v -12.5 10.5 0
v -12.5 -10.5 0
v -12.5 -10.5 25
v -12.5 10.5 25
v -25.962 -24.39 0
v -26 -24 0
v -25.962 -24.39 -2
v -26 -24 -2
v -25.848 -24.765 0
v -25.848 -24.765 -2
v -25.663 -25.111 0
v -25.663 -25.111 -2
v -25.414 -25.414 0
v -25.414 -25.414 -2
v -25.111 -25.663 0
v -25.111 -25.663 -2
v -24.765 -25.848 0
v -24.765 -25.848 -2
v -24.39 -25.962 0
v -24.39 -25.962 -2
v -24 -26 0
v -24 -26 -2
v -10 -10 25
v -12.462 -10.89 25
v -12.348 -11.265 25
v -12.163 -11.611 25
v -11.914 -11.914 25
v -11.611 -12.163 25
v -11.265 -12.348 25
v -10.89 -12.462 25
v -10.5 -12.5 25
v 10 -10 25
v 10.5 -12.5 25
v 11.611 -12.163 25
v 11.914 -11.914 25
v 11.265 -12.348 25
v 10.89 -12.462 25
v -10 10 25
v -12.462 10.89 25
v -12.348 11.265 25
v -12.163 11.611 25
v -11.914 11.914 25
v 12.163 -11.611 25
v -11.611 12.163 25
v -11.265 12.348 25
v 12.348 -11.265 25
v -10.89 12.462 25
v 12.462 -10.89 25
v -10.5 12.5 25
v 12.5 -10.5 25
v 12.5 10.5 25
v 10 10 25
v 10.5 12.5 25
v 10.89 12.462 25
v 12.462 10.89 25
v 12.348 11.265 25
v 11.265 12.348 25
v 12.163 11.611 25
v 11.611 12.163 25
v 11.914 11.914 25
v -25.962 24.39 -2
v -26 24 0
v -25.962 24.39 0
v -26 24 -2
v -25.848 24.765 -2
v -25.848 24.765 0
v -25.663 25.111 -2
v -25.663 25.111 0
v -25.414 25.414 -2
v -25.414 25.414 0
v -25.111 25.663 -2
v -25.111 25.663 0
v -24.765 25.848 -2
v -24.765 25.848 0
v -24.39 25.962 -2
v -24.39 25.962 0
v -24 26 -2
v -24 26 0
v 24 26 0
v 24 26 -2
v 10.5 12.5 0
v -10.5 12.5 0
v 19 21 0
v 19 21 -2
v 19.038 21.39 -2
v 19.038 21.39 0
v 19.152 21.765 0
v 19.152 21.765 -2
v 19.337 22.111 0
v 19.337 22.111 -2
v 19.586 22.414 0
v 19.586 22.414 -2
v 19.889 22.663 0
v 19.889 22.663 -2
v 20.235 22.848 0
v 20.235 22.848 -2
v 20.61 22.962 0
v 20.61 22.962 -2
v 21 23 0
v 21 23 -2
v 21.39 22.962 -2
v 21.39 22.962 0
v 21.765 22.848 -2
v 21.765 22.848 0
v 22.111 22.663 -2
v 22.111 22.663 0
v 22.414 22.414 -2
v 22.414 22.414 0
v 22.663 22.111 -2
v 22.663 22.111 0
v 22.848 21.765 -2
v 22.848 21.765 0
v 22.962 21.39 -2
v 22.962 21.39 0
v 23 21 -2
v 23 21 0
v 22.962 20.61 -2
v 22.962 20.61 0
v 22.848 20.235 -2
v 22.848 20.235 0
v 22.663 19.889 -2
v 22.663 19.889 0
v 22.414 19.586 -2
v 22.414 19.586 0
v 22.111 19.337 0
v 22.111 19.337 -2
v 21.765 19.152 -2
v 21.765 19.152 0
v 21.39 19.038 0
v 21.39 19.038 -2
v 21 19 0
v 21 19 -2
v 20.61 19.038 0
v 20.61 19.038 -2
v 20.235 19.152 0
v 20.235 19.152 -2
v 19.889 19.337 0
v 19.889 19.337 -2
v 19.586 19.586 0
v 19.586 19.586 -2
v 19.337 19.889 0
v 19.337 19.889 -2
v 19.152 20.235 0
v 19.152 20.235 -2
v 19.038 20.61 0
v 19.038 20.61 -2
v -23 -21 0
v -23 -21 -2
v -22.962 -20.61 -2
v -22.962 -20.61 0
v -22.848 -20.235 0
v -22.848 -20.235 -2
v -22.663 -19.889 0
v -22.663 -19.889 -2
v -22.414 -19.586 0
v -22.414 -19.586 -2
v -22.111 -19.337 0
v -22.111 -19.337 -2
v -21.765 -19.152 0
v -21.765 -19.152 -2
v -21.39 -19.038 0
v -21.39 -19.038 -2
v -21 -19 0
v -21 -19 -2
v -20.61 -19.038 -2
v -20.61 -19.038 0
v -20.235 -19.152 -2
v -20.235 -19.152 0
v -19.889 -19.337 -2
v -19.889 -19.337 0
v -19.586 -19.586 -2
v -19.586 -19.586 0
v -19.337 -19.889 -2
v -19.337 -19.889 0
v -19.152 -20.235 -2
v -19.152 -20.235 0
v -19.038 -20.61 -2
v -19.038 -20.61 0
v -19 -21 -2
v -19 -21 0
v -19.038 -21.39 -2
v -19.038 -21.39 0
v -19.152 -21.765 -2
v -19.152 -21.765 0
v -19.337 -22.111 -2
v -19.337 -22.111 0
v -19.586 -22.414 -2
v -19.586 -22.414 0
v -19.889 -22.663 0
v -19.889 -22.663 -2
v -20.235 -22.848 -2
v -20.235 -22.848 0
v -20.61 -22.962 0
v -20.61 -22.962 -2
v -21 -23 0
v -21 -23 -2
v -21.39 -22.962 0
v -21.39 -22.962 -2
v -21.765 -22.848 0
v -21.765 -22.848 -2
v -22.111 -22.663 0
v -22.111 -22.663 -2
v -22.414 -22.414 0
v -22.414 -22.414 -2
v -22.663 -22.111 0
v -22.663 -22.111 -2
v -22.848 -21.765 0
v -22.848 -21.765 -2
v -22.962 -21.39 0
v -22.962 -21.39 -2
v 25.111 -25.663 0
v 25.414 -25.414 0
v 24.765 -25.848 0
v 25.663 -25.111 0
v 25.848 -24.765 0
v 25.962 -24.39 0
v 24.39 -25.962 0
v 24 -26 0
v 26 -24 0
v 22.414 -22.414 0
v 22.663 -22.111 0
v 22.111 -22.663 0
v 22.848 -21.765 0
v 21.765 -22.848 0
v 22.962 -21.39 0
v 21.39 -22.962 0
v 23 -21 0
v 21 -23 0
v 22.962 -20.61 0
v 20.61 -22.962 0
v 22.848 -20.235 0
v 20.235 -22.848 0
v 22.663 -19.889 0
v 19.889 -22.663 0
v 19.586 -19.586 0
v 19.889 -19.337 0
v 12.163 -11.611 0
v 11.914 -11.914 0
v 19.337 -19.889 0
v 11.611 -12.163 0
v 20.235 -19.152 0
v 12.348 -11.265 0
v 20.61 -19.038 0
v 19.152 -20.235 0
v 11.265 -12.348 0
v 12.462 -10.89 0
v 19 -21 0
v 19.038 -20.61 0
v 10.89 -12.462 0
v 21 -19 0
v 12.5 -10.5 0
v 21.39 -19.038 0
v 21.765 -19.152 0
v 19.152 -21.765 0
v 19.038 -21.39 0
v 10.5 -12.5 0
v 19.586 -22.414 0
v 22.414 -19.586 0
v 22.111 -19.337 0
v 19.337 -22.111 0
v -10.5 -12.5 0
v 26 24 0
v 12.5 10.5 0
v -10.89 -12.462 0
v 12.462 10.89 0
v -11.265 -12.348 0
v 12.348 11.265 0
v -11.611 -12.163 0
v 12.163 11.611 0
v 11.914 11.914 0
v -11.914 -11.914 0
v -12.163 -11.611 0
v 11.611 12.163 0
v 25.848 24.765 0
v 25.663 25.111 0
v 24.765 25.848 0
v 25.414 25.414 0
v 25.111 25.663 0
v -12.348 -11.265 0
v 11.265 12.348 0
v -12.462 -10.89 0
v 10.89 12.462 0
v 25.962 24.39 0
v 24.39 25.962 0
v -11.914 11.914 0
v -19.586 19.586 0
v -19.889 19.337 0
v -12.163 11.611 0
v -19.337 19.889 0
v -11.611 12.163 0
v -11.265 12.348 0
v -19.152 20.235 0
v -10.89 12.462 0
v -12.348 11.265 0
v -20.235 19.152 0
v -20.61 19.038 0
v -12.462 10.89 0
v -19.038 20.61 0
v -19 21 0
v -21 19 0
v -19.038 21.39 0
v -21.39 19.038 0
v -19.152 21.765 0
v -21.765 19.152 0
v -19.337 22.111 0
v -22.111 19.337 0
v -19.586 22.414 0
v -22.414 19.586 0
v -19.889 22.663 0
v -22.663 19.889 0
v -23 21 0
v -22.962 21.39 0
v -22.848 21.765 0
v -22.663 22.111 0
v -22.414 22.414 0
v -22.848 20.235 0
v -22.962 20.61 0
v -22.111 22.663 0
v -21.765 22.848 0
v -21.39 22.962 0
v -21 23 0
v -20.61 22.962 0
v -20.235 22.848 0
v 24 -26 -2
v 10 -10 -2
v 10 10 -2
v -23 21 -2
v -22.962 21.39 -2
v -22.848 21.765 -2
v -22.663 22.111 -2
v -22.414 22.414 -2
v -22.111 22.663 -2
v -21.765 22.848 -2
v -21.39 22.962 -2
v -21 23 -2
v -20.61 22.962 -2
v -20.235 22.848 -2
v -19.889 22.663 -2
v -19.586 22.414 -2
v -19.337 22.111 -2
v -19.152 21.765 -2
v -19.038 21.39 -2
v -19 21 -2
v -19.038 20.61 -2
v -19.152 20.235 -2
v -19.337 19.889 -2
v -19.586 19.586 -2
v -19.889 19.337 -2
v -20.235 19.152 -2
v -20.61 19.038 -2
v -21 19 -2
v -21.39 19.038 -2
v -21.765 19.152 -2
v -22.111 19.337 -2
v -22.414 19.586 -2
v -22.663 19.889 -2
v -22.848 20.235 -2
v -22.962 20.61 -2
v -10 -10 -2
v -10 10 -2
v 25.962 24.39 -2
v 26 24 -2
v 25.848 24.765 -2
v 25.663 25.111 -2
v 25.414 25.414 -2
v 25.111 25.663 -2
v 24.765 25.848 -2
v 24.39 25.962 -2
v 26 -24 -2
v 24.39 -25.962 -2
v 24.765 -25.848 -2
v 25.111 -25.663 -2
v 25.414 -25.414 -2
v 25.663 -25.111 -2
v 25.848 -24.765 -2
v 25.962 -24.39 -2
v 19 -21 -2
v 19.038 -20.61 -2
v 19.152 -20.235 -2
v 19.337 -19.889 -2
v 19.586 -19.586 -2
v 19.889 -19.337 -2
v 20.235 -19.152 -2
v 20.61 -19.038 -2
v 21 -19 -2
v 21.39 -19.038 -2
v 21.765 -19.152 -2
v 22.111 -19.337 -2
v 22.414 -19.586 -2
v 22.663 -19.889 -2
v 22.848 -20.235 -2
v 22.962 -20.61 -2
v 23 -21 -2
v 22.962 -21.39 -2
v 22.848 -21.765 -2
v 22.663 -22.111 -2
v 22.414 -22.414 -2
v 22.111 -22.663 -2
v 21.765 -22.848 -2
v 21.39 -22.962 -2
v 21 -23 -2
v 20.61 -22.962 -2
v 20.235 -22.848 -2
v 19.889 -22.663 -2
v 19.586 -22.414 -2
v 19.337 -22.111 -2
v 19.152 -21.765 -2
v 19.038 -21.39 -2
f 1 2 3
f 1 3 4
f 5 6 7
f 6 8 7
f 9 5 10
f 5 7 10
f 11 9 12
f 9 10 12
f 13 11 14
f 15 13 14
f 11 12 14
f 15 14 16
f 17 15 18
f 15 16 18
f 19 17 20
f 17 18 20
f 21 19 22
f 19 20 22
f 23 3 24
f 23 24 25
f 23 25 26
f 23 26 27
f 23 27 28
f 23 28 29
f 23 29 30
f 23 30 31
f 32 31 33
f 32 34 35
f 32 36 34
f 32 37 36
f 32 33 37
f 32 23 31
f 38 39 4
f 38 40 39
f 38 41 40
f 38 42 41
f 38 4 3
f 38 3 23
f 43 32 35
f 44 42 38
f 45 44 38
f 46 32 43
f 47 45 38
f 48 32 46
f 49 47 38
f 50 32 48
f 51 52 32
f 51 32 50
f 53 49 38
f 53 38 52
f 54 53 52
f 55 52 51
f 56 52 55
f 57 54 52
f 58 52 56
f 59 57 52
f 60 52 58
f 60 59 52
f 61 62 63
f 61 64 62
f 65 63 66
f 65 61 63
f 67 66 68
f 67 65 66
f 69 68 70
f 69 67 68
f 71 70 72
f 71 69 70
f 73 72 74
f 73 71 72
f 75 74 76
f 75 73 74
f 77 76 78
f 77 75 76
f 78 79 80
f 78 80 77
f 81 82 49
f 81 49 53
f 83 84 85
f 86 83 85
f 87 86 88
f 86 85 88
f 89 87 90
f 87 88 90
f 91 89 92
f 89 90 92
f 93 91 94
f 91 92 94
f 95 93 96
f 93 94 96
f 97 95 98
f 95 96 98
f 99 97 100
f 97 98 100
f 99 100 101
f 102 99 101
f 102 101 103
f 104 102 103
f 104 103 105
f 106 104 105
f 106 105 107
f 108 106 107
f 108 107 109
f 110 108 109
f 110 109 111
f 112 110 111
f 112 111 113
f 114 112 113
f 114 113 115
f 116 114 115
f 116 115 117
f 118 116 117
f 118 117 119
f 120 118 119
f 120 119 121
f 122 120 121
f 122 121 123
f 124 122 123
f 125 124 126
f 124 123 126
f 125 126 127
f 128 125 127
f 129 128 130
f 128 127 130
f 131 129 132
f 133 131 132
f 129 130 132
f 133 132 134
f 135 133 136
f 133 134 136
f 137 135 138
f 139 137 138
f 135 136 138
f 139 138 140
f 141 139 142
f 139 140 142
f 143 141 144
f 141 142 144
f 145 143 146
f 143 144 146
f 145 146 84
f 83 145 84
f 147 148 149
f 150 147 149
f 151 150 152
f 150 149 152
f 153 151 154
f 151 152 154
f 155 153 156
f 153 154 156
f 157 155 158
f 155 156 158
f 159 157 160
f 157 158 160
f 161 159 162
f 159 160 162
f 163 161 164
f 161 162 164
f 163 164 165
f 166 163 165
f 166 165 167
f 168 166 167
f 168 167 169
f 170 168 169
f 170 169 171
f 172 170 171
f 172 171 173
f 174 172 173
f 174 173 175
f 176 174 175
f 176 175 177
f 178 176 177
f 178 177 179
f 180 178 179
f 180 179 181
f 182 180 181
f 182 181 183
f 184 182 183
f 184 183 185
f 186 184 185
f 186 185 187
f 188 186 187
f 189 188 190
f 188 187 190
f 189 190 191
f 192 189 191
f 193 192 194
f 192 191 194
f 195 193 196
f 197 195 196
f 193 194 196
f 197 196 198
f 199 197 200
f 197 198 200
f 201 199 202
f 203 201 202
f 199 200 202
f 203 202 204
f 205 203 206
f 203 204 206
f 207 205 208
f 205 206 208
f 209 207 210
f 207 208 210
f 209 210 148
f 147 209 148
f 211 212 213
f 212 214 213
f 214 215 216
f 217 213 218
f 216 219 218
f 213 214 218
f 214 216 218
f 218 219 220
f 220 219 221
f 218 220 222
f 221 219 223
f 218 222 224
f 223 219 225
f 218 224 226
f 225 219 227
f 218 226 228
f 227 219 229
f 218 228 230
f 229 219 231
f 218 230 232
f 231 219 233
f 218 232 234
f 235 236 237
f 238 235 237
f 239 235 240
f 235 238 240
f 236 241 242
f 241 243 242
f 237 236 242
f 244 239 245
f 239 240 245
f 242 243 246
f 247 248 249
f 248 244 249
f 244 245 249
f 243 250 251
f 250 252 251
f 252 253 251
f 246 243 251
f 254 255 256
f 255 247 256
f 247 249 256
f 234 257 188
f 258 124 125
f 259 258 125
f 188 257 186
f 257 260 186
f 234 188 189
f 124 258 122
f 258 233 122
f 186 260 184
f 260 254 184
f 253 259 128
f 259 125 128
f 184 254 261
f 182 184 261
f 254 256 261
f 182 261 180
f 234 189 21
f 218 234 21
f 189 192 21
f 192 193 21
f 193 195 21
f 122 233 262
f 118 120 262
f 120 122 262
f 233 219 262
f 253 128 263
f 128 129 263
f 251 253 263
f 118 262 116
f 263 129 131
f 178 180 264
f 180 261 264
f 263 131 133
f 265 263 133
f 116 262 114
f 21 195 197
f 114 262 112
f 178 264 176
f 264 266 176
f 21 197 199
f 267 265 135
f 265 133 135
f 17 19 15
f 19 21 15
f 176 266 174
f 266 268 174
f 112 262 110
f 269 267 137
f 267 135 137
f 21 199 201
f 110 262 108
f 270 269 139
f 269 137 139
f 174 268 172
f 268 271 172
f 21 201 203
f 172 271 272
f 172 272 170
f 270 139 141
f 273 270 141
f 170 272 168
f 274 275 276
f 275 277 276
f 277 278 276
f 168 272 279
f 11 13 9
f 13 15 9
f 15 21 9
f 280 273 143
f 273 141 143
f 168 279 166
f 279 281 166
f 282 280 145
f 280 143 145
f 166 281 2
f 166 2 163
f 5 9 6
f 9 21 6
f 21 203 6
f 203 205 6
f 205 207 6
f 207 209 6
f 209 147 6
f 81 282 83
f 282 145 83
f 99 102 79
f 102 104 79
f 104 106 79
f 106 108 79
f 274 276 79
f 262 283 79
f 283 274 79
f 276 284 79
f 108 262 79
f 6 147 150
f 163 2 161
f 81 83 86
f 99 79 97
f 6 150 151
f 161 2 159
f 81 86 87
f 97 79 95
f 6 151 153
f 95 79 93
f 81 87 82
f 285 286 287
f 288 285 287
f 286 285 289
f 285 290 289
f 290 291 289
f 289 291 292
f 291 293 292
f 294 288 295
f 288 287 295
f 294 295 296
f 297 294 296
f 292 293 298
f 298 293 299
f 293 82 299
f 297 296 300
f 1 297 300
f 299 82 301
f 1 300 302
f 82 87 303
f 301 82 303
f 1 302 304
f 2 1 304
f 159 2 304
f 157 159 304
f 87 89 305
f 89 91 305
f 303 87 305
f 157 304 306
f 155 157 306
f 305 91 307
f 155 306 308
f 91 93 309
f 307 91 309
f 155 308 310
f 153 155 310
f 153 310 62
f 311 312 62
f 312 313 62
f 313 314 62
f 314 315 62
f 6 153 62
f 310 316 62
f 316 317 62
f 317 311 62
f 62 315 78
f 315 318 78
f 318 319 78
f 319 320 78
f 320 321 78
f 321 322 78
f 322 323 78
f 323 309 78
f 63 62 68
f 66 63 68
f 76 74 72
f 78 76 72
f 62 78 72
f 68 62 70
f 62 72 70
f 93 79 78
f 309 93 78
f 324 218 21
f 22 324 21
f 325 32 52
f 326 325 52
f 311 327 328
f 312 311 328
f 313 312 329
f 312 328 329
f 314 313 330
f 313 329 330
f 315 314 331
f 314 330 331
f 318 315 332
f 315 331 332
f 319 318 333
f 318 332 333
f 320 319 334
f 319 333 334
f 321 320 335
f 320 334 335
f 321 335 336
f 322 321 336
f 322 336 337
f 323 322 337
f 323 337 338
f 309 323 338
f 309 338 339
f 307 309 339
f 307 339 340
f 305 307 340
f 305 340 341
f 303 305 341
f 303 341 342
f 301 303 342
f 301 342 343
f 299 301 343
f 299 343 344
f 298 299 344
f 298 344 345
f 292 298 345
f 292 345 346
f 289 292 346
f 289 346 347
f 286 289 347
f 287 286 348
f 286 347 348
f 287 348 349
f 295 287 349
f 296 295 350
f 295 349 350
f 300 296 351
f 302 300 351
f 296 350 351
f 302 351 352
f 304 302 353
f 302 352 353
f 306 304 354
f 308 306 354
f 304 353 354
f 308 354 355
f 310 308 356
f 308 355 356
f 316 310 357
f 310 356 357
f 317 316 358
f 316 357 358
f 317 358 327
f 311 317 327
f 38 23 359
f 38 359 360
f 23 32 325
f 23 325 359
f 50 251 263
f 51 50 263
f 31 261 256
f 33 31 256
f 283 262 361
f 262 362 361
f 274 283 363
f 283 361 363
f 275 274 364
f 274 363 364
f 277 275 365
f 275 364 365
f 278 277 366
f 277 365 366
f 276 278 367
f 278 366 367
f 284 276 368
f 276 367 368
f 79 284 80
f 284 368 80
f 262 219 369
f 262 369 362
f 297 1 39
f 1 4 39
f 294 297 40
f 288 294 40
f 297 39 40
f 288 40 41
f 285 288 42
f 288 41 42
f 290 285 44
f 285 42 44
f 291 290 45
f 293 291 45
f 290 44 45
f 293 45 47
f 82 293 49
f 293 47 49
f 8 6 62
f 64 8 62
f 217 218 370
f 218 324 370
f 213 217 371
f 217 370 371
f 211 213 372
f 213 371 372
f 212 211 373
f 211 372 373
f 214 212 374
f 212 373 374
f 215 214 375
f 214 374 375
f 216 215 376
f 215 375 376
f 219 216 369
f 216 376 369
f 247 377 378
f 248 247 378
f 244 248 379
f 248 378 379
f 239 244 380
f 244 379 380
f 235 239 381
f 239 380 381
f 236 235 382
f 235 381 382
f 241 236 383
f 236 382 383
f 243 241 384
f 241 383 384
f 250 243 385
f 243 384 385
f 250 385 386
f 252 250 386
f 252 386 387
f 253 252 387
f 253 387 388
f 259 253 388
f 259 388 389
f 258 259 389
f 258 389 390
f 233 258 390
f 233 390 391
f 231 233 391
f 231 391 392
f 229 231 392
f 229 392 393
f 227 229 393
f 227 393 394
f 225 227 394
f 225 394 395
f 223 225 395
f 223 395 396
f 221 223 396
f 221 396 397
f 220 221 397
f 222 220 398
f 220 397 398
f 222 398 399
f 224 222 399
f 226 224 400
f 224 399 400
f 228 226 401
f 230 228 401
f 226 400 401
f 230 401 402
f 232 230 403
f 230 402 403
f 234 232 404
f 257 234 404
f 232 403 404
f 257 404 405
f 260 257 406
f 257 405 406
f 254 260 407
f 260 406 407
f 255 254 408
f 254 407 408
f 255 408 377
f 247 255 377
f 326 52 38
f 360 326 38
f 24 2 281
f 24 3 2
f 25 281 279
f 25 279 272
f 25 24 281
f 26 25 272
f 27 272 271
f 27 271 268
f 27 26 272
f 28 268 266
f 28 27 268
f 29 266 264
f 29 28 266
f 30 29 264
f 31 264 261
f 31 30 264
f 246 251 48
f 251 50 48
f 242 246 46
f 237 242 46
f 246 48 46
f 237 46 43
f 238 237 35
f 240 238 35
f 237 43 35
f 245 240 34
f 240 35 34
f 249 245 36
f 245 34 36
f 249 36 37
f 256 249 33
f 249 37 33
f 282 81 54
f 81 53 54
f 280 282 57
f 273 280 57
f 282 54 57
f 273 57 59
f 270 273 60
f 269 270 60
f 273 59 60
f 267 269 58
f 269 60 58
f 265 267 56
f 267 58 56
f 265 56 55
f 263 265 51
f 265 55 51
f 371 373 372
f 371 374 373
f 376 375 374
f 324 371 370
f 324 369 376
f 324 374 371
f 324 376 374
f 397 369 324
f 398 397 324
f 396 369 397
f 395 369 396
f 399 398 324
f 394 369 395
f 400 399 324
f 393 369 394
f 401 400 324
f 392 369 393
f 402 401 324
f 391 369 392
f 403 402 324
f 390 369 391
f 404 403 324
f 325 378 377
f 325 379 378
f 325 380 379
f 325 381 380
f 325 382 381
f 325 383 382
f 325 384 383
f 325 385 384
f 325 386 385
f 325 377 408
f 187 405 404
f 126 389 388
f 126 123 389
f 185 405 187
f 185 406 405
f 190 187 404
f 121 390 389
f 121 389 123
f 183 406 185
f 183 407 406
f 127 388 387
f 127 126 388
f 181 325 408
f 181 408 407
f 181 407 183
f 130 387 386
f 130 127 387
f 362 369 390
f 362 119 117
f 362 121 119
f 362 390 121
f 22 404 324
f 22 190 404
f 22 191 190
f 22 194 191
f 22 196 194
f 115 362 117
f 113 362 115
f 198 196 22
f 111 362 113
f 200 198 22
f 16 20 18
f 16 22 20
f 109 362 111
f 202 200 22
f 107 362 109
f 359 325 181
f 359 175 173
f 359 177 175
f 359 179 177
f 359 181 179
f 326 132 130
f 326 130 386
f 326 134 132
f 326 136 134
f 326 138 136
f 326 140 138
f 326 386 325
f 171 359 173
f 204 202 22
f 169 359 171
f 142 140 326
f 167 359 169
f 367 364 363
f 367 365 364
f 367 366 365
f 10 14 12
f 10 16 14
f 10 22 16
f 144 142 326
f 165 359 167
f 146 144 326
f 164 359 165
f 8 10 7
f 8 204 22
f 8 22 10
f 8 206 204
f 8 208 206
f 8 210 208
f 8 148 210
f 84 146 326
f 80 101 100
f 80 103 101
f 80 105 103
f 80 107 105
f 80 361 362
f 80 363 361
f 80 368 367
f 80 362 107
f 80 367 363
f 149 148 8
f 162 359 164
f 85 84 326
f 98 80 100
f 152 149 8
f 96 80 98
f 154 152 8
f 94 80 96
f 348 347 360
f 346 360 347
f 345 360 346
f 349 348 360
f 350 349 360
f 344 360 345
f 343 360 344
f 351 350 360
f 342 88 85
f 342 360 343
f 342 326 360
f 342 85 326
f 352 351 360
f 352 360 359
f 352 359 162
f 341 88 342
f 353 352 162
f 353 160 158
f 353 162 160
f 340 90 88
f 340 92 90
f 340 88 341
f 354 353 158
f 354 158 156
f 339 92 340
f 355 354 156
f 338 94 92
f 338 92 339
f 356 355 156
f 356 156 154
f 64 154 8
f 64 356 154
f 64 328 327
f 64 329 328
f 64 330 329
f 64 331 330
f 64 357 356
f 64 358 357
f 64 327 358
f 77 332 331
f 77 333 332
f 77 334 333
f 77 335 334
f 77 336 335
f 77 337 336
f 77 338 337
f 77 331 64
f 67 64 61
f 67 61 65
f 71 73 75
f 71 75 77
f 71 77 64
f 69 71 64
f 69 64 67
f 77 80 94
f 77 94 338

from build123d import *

# Parameters (mm, degrees)
SKETCH_1_W          = 25
SKETCH_1_H          = 25
SKETCH_1_W_2        = 20
SKETCH_1_H_2        = 20
EXTRUDE_1_DEPTH     = 25
SKETCH_3_W          = 52
SKETCH_3_H          = 52
EXTRUDE_2_DEPTH     = 2
SKETCH_4_W          = 20
SKETCH_4_H          = 20
CUT_EXTRUDE_1_DEPTH = 28
FILLET_1_R          = 2
FILLET_2_R          = 2
FILLET_3_R          = 2
FILLET_4_R          = 2
FILLET_5_R          = 2
FILLET_6_R          = 2
FILLET_7_R          = 2
FILLET_8_R          = 2
SKETCH_5_R          = 2
CUT_EXTRUDE_2_DEPTH = 28


with BuildPart() as part:
    # 草图1 → 凸台-拉伸1 (new body)
    with BuildSketch(Plane.XY):
        Rectangle(SKETCH_1_W, SKETCH_1_H)
        Rectangle(SKETCH_1_W_2, SKETCH_1_H_2, mode=Mode.SUBTRACT)
    extrude(amount=EXTRUDE_1_DEPTH)

    # 草图3 → 凸台-拉伸2 (add)
    with BuildSketch(Plane(origin=(0, 0, 0), x_dir=(-1, 0, 0), z_dir=(0, 0, -1))):
        Rectangle(SKETCH_3_W, SKETCH_3_H)
    extrude(amount=EXTRUDE_2_DEPTH)

    # 草图4 → 切除-拉伸1 (cut, through all)
    with BuildSketch(Plane(origin=(0, 0, -2), x_dir=(-1, 0, 0), z_dir=(0, 0, -1))):
        Rectangle(SKETCH_4_W, SKETCH_4_H)
    extrude(amount=-CUT_EXTRUDE_1_DEPTH, mode=Mode.SUBTRACT)

    # 圆角1
    fillet_1_edges = [part.edges().sort_by_distance(p)[0] for p in [
        (-26, 26, -1),
    ]]
    fillet(fillet_1_edges, radius=FILLET_1_R)

    # 圆角2
    fillet_2_edges = [part.edges().sort_by_distance(p)[0] for p in [
        (-26, -26, -1),
    ]]
    fillet(fillet_2_edges, radius=FILLET_2_R)

    # 圆角3
    fillet_3_edges = [part.edges().sort_by_distance(p)[0] for p in [
        (26, -26, -1),
    ]]
    fillet(fillet_3_edges, radius=FILLET_3_R)

    # 圆角4
    fillet_4_edges = [part.edges().sort_by_distance(p)[0] for p in [
        (26, 26, -1),
    ]]
    fillet(fillet_4_edges, radius=FILLET_4_R)

    # 圆角5
    fillet_5_edges = [part.edges().sort_by_distance(p)[0] for p in [
        (-12.5, -12.5, 12.5),
    ]]
    fillet(fillet_5_edges, radius=FILLET_5_R)

    # 圆角6
    fillet_6_edges = [part.edges().sort_by_distance(p)[0] for p in [
        (-12.5, 12.5, 12.5),
    ]]
    fillet(fillet_6_edges, radius=FILLET_6_R)

    # 圆角7
    fillet_7_edges = [part.edges().sort_by_distance(p)[0] for p in [
        (12.5, 12.5, 12.5),
    ]]
    fillet(fillet_7_edges, radius=FILLET_7_R)

    # 圆角8
    fillet_8_edges = [part.edges().sort_by_distance(p)[0] for p in [
        (12.5, -12.5, 12.5),
    ]]
    fillet(fillet_8_edges, radius=FILLET_8_R)

    # 草图5 → 切除-拉伸2 (cut, through all)
    with BuildSketch(Plane(origin=(0, 0, -2), x_dir=(-1, 0, 0), z_dir=(0, 0, -1))):
        with Locations((-21, 21)):
            Circle(SKETCH_5_R)
        with Locations((21, 21)):
            Circle(SKETCH_5_R)
        with Locations((-21, -21)):
            Circle(SKETCH_5_R)
        with Locations((21, -21)):
            Circle(SKETCH_5_R)
    extrude(amount=-CUT_EXTRUDE_2_DEPTH, mode=Mode.SUBTRACT)


solid = part.part
